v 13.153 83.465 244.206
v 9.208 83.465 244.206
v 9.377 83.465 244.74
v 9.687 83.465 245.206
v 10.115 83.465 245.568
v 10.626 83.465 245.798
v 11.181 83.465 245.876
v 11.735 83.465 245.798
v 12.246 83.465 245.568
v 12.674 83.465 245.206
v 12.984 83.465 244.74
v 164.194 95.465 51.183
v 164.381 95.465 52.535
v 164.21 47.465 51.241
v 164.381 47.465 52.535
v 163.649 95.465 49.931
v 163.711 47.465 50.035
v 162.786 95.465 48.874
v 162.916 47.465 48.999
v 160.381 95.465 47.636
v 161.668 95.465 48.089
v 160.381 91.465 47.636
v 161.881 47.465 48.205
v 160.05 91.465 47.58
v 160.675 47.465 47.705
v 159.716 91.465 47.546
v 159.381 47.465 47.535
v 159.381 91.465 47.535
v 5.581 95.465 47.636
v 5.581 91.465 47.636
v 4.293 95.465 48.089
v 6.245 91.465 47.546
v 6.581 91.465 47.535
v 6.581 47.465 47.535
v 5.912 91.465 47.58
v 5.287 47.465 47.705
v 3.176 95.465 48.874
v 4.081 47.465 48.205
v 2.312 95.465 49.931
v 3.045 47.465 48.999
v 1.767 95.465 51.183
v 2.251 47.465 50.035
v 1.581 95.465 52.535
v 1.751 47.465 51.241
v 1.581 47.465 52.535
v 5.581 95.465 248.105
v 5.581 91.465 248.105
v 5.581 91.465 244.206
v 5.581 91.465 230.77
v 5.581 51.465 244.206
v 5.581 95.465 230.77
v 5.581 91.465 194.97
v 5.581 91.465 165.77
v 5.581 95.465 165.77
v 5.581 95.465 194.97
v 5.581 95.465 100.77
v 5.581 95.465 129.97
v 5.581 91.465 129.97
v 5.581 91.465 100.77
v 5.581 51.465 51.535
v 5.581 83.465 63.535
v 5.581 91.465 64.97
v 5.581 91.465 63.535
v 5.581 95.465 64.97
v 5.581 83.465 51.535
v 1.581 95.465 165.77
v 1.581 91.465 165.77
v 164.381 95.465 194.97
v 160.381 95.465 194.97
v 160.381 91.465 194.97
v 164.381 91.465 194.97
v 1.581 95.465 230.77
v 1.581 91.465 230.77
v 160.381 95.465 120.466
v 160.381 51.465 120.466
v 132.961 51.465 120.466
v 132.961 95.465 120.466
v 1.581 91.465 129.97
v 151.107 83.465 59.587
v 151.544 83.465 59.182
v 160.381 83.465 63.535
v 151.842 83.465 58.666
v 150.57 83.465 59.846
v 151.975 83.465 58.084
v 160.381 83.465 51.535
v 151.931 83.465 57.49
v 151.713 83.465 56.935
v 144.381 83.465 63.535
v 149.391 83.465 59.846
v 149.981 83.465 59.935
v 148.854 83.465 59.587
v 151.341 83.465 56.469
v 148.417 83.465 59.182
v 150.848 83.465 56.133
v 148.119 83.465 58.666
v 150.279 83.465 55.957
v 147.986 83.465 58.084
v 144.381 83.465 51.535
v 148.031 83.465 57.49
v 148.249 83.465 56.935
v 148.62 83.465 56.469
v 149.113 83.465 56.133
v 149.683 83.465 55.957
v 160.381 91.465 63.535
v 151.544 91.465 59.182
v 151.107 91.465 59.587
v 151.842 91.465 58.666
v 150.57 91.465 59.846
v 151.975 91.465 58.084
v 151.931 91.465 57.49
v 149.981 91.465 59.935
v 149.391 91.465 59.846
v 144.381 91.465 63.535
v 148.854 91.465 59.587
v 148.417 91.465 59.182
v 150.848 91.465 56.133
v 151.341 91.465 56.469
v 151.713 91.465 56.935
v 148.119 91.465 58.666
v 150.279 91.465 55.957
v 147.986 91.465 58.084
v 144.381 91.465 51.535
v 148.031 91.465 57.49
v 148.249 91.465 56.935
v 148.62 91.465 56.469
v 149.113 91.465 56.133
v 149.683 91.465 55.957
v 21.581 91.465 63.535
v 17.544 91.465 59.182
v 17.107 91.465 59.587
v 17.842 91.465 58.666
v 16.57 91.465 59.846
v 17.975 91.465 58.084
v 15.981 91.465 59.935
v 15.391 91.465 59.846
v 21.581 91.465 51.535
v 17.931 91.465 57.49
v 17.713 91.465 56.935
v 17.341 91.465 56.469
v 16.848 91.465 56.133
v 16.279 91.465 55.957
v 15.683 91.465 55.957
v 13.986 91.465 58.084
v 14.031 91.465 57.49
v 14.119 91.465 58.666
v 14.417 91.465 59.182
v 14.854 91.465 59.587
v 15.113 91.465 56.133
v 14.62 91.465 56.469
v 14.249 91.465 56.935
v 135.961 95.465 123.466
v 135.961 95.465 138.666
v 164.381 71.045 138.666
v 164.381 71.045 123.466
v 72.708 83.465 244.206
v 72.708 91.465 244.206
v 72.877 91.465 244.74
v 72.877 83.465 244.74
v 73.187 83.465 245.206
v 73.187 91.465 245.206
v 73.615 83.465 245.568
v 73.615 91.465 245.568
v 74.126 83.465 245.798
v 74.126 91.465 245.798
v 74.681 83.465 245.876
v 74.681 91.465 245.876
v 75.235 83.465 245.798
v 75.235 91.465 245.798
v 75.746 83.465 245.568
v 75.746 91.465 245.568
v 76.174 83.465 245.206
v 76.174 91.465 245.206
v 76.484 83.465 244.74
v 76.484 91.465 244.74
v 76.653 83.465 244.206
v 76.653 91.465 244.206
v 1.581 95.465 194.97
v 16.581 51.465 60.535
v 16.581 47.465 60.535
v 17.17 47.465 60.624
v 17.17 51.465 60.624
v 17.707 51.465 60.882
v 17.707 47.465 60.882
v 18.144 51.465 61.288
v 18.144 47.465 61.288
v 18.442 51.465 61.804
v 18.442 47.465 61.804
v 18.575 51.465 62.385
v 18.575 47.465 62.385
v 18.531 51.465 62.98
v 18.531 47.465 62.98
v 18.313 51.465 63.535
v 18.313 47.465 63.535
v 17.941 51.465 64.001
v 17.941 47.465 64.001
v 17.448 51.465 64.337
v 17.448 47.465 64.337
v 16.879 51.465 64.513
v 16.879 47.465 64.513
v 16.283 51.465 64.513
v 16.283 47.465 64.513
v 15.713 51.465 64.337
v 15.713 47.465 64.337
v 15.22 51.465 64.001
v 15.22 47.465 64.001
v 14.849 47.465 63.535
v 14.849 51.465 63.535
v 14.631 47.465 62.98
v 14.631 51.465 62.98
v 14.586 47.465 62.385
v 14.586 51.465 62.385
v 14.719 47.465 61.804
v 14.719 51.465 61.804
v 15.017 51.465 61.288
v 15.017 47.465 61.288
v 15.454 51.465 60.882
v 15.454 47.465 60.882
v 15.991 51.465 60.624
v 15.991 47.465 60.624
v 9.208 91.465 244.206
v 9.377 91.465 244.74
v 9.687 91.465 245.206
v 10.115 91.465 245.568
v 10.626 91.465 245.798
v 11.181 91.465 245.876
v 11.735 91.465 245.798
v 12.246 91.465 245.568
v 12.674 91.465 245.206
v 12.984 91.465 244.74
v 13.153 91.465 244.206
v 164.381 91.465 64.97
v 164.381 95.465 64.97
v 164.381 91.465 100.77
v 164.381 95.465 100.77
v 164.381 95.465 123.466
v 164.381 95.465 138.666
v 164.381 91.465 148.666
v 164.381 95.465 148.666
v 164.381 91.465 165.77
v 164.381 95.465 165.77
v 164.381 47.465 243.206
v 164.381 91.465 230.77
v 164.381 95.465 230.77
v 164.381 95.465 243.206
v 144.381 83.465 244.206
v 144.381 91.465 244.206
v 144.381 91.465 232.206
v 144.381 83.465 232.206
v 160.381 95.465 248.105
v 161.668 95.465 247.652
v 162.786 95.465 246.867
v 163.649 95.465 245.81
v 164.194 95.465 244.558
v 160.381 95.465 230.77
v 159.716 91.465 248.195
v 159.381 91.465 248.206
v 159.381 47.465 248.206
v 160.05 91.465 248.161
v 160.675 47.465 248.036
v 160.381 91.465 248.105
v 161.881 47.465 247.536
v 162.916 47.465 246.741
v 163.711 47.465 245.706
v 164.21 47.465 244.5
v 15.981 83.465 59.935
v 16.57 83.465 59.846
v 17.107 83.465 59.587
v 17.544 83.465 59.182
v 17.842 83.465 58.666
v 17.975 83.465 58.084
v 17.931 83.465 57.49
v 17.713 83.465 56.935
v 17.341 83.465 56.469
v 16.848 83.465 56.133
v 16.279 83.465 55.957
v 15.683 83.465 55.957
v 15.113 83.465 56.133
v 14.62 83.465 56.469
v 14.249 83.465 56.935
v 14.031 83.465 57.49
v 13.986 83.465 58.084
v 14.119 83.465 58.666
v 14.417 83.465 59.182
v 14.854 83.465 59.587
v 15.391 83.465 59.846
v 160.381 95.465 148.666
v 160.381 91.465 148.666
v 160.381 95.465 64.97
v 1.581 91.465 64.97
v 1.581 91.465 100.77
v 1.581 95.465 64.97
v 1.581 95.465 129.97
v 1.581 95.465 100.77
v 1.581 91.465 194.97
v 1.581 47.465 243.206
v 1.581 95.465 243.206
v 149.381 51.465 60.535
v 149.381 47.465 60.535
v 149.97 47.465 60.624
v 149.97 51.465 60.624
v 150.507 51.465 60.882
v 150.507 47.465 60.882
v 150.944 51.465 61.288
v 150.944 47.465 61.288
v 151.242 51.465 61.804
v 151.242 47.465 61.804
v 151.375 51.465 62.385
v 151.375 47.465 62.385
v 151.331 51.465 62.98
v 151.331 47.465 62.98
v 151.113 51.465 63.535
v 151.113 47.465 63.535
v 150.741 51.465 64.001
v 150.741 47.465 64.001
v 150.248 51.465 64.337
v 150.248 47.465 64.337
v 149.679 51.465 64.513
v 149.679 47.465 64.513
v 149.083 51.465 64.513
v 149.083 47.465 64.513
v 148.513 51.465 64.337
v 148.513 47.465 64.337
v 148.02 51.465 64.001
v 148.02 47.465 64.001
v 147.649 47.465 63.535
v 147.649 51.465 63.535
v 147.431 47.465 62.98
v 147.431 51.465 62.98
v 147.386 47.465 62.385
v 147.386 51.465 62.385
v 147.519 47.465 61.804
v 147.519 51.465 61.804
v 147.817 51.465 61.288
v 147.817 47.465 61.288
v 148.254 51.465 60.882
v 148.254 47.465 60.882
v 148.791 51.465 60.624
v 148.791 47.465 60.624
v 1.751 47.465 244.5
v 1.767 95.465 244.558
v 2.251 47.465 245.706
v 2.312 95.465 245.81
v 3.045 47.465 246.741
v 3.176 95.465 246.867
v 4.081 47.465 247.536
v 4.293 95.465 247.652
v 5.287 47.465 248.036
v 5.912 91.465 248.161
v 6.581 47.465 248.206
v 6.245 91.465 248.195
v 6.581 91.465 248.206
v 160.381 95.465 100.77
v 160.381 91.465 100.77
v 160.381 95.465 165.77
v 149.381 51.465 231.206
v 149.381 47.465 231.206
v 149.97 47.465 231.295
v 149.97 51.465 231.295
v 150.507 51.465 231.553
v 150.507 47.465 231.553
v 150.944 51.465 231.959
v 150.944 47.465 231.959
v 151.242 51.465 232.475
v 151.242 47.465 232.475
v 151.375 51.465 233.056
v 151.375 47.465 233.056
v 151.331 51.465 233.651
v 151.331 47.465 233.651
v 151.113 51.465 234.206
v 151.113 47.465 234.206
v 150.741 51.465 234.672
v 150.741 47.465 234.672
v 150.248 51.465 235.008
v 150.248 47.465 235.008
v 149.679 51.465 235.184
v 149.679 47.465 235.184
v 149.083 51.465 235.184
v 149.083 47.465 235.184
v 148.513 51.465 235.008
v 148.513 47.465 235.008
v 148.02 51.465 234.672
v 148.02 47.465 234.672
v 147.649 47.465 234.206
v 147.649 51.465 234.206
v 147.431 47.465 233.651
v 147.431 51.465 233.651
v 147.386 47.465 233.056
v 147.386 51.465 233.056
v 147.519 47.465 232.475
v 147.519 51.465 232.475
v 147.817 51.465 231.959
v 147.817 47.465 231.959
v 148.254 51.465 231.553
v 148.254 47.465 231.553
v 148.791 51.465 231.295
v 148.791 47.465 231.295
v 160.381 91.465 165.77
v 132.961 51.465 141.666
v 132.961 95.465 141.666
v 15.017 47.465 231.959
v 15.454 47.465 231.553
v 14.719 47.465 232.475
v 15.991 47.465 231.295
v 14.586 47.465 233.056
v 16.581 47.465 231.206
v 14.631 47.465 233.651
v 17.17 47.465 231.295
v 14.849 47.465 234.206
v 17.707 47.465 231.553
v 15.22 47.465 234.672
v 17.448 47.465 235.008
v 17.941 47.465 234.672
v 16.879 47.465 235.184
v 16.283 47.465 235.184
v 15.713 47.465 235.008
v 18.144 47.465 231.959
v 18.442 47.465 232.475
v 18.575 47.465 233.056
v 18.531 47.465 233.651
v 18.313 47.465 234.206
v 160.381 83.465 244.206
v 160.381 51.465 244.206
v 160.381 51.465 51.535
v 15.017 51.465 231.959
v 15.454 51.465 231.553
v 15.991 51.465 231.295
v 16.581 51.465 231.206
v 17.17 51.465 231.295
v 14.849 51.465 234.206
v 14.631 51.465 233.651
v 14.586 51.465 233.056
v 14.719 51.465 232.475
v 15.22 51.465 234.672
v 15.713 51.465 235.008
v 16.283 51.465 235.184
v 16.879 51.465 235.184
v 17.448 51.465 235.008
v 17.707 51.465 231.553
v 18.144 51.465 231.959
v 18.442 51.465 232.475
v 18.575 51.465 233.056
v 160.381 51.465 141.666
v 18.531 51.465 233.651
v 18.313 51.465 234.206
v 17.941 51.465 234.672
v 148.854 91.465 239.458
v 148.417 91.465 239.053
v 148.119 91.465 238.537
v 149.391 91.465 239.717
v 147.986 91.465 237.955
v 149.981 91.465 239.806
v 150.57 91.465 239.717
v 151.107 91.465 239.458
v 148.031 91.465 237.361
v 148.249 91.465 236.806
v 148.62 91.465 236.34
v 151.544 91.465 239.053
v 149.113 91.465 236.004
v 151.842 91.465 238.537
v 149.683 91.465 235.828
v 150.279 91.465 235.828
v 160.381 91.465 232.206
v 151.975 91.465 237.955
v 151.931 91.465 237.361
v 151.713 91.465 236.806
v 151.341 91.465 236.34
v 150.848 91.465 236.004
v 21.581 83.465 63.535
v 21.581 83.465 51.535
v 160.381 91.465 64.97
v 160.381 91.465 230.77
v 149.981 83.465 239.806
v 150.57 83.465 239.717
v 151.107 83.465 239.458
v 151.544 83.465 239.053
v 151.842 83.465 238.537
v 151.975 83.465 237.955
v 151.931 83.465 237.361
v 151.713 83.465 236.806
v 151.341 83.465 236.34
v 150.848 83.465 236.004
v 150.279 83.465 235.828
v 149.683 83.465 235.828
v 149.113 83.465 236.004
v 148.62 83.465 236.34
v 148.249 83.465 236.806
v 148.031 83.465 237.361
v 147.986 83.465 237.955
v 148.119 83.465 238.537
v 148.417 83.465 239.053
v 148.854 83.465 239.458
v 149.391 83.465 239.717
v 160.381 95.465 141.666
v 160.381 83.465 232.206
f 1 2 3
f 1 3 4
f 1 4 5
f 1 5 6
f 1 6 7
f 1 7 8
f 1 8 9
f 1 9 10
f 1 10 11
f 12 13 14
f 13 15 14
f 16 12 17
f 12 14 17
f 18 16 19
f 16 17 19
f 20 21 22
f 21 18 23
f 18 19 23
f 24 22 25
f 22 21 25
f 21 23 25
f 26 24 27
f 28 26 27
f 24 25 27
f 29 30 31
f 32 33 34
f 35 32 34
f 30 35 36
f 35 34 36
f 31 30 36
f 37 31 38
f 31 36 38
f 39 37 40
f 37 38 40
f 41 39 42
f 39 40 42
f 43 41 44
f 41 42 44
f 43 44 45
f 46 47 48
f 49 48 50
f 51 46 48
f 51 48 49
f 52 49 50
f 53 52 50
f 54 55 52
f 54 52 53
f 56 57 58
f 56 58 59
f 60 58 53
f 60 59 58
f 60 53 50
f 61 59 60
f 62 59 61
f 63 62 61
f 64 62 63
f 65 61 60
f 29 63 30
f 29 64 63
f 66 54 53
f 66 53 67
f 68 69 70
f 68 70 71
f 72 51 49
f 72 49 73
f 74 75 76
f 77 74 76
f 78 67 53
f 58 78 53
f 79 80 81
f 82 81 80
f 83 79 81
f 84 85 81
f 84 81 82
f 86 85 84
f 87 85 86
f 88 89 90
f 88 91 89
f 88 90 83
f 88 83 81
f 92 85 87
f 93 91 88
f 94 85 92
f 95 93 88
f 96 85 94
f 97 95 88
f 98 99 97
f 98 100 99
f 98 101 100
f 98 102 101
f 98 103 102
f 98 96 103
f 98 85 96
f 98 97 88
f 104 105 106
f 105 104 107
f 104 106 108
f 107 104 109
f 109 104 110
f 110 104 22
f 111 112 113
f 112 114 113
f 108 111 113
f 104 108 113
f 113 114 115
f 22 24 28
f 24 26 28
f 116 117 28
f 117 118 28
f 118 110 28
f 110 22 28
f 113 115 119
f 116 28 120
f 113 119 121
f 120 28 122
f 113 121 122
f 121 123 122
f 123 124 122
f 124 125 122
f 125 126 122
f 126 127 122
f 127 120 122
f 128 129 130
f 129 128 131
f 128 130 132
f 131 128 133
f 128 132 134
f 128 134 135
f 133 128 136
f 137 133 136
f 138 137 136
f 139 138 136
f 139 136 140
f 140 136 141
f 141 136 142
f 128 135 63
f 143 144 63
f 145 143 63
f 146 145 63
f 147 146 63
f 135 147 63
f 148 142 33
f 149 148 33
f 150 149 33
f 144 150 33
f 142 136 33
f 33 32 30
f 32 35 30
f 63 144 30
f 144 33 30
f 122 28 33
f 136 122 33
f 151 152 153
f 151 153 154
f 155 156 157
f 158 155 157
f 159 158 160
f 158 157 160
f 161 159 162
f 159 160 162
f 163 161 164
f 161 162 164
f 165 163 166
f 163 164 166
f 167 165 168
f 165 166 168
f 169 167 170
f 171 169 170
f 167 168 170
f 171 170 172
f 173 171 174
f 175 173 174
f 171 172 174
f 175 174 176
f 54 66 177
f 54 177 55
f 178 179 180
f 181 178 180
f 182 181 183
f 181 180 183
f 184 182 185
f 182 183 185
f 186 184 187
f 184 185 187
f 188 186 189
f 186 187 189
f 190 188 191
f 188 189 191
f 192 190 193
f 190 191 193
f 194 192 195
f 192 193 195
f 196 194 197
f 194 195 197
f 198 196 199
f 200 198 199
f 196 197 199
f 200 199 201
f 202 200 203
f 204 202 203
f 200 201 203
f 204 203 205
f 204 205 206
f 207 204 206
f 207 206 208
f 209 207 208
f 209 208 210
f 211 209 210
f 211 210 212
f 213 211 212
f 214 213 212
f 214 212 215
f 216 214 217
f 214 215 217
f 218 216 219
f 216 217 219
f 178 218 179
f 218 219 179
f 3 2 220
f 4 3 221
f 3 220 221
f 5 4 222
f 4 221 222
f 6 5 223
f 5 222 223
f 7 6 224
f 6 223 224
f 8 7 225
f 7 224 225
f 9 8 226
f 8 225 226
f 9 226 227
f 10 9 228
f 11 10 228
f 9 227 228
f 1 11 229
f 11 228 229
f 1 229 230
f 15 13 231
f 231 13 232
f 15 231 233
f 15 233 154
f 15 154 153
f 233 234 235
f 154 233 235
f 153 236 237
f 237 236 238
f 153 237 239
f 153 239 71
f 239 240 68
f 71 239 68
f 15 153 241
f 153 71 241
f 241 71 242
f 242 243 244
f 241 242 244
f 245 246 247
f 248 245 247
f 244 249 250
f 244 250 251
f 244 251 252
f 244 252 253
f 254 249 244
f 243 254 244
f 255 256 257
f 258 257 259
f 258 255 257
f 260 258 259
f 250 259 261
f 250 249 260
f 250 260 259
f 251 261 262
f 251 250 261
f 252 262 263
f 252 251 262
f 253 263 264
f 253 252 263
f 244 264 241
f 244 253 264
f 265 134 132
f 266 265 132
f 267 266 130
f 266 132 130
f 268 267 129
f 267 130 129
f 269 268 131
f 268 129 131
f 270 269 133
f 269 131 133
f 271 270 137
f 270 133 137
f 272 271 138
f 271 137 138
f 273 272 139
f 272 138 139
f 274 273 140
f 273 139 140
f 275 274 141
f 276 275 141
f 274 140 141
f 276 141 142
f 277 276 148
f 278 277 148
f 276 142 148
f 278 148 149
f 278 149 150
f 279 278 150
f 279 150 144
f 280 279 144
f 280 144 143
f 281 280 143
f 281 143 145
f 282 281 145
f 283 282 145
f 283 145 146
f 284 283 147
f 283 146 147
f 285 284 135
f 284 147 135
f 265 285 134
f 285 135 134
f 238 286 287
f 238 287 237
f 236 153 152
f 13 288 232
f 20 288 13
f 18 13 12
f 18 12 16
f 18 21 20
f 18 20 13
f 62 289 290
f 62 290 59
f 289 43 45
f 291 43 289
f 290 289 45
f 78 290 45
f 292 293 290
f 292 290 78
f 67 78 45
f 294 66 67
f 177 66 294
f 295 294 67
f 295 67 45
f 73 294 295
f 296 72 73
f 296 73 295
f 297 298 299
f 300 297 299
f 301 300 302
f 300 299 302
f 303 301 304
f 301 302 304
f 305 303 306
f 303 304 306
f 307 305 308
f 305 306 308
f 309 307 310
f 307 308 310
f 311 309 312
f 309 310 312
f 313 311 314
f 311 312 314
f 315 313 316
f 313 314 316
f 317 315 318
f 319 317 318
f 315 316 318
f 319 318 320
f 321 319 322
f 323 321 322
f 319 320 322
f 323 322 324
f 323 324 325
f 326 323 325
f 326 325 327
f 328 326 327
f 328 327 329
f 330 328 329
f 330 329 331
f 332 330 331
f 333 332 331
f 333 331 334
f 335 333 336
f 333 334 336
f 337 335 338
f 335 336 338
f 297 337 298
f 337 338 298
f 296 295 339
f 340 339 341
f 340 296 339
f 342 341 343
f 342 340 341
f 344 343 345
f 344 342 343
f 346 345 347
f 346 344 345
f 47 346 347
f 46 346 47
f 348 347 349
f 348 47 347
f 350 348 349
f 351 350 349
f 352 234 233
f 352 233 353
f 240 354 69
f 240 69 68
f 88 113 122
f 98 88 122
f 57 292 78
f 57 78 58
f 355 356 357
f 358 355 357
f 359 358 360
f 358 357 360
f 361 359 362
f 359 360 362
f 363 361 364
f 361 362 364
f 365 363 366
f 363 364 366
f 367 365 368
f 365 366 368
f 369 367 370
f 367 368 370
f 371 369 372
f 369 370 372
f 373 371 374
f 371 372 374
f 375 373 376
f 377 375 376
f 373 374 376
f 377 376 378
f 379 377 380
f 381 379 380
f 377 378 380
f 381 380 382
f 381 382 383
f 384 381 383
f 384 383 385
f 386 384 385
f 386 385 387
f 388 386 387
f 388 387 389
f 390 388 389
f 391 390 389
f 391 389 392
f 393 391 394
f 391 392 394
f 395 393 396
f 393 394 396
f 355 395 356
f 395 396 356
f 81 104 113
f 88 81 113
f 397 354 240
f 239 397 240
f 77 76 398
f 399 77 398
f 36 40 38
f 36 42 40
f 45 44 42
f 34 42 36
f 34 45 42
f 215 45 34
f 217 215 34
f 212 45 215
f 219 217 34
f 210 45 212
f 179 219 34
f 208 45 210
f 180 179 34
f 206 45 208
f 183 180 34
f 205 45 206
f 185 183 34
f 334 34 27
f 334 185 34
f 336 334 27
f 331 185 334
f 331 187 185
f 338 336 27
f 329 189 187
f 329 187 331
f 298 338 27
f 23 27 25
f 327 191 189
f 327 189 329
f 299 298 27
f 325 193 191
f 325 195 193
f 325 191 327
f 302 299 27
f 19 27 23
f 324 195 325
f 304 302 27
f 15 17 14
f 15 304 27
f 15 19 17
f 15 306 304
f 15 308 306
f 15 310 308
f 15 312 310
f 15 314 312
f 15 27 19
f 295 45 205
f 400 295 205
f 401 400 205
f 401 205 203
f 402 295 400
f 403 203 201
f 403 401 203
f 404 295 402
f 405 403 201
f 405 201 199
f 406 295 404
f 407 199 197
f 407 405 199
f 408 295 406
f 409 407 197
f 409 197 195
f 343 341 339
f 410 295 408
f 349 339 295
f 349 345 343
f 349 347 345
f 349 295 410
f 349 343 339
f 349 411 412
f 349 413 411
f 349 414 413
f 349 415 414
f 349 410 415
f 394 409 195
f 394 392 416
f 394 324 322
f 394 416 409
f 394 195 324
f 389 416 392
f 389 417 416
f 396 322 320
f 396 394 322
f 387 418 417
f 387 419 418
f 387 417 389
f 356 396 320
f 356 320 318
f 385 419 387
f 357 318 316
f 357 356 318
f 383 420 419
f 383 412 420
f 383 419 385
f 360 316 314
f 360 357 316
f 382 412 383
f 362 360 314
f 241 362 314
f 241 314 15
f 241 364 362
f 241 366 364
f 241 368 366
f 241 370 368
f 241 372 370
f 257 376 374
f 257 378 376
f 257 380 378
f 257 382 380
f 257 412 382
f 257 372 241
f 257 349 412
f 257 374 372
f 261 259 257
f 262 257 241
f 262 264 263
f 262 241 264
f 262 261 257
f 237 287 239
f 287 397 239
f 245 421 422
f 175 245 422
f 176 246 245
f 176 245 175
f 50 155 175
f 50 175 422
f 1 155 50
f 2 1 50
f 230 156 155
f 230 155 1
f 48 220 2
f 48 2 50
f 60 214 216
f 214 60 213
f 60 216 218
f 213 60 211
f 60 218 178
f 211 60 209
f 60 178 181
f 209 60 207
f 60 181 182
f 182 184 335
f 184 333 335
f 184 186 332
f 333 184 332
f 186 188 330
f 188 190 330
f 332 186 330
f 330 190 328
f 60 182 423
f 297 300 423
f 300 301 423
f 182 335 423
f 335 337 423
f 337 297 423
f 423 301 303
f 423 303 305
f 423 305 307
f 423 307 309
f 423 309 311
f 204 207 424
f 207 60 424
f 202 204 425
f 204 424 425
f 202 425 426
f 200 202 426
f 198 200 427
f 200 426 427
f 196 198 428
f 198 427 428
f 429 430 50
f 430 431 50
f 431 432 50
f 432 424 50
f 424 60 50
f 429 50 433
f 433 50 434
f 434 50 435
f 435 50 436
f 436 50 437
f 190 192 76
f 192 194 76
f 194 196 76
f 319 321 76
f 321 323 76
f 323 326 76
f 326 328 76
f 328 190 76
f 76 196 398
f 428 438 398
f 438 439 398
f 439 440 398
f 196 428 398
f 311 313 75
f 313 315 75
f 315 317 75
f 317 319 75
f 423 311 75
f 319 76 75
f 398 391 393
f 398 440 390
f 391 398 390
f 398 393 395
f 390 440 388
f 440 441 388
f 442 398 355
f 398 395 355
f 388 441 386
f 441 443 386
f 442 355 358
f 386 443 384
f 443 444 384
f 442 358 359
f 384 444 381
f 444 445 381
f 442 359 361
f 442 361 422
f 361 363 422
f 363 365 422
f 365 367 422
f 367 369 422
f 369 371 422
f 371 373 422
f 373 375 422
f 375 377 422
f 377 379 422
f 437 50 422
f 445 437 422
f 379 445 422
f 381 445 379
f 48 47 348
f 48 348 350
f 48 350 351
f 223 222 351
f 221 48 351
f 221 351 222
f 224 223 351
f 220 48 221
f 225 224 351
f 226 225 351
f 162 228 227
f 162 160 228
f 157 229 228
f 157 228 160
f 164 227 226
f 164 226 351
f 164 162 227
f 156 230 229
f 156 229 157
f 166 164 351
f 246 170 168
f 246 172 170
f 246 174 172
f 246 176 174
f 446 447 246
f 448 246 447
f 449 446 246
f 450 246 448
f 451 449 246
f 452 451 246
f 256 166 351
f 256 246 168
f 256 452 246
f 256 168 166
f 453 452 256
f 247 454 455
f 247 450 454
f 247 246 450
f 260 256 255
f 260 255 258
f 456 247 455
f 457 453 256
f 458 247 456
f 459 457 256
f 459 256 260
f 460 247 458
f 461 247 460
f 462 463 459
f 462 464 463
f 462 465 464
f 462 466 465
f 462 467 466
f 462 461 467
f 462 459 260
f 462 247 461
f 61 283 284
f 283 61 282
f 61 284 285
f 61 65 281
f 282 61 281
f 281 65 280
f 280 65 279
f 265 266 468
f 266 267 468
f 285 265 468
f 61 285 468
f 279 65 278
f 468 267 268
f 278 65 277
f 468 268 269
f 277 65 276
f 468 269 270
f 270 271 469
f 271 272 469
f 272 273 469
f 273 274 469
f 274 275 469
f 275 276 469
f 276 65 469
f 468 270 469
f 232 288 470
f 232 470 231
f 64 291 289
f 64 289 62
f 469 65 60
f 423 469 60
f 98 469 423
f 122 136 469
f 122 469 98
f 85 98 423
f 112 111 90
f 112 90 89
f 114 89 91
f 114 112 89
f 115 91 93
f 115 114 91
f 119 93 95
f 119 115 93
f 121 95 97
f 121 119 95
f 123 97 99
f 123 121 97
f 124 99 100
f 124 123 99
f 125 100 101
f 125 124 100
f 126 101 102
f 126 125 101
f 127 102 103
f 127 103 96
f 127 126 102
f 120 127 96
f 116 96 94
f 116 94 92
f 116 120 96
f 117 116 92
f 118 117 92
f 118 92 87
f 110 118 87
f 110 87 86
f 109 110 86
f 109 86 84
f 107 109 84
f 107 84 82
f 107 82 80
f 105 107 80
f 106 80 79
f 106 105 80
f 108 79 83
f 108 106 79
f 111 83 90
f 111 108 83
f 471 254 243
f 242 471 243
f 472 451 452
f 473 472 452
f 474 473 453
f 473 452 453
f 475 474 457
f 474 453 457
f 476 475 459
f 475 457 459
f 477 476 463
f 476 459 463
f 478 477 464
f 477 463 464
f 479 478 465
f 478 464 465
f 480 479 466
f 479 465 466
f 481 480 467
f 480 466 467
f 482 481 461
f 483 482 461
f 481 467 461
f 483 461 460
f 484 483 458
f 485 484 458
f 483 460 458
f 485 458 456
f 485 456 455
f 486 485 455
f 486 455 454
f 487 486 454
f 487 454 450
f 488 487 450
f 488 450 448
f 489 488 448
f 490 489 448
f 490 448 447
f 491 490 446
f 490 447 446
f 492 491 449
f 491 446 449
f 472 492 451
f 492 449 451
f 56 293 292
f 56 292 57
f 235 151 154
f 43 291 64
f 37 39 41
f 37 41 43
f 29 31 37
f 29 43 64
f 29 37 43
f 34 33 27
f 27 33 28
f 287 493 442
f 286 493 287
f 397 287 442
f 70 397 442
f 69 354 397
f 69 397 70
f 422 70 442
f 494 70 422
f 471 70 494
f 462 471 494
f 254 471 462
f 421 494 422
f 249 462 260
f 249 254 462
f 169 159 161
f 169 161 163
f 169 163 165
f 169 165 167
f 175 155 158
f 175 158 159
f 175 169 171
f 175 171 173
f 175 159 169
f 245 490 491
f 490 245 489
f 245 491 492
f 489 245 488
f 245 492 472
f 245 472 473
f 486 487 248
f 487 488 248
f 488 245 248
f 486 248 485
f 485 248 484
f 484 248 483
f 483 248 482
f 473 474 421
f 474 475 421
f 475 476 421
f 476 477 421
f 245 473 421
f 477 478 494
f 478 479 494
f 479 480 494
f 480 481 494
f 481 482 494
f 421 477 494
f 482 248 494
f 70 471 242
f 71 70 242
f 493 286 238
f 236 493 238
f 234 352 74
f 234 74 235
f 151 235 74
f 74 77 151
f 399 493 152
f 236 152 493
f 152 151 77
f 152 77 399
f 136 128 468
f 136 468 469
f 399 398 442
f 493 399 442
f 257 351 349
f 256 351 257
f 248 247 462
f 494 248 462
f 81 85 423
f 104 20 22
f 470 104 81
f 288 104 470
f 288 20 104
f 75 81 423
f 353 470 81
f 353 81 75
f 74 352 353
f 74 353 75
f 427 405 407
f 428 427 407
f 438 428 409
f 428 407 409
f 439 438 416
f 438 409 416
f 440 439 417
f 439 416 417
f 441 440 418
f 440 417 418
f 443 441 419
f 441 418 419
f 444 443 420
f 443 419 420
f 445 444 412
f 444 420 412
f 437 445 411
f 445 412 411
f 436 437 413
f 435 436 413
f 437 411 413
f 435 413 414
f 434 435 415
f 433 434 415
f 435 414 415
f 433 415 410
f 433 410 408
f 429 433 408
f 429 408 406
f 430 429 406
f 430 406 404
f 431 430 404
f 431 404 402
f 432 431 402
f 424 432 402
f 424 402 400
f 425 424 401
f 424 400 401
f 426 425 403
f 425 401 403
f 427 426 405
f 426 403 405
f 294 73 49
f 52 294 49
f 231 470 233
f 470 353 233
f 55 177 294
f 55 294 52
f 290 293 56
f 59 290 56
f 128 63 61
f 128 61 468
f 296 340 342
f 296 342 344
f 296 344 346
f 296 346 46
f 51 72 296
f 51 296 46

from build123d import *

# Parameters (mm, degrees)
BOSS_EXTRUDE2_DEPTH   = 4
SKETCH1_W             = 4.0000000000000036
SKETCH1_H             = 29.19999999999999
BOSS_EXTRUDE2_2_DEPTH = 4
BOSS_EXTRUDE2_3_DEPTH = 4
BOSS_EXTRUDE2_4_DEPTH = 4
SKETCH1_W_2           = 4
SKETCH1_H_2           = 17.435500273431558
BOSS_EXTRUDE2_5_DEPTH = 4
BOSS_EXTRUDE2_6_DEPTH = 4
BOSS_EXTRUDE2_7_DEPTH = 4
SKETCH1_H_3           = 17.43550027343155
BOSS_EXTRUDE2_8_DEPTH = 4
CUT_EXTRUDE1_DEPTH    = 4
SKETCH3_W             = 162.8
SKETCH3_H             = 200.6710005468631
BOSS_EXTRUDE3_DEPTH   = 40
SKETCH4_W             = 162.8
SKETCH4_H             = 200.6710005468631
BOSS_EXTRUDE4_DEPTH   = 4
FILLET1_R             = 5
FILLET2_R             = 5
FILLET3_R             = 5
FILLET4_R             = 5
SKETCH5_R             = 1.9999999999999967
SKETCH5_R_2           = 2
SKETCH5_R_3           = 2.0000000000000036
CUT_EXTRUDE2_DEPTH    = 4
BOSS_EXTRUDE5_DEPTH   = 8
SKETCH7_R             = 2.0000000000000036
CUT_EXTRUDE3_DEPTH    = 8
SKETCH8_W             = 16
SKETCH8_H             = 12
BOSS_EXTRUDE6_DEPTH   = 8
SKETCH9_R             = 1.9999999999999967
CUT_EXTRUDE4_DEPTH    = 8
SKETCH11_R            = 2
SKETCH11_R_2          = 1.9999999999999967
CUT_EXTRUDE5_DEPTH    = 8
SKETCH12_W            = 15.199999999999989
SKETCH12_H            = 20.419999999999987
CUT_EXTRUDE6_DEPTH    = 4
BOSS_EXTRUDE7_DEPTH   = 44
SKETCH14_W            = 24.419999999999987
SKETCH14_H            = 15.199999999999989
BOSS_EXTRUDE8_DEPTH   = 19.58
CHAMFER2_SIZE2        = 24.42
CHAMFER2_SIZE         = 28.42


with BuildPart() as part:
    # Sketch1 → Boss-Extrude2 (new body)
    with BuildSketch(Plane(origin=(0, 95.46497129757712, 0), x_dir=(1, 0, 0), z_dir=(0, 1, 0))):
        Polygon((5.580685050864992, -64.97044696543385), (5.580685050864992, -47.5349466920023), (1.580685050864986, -47.5349466920023), (1.5806850508649888, -64.97044696543384), align=None)
    extrude(amount=-BOSS_EXTRUDE2_DEPTH)



with BuildPart() as body_2:
    # Sketch1 → Boss-Extrude2 2 (new body)
    with BuildSketch(Plane(origin=(0, 95.46497129757712, 0), x_dir=(1, 0, 0), z_dir=(0, 1, 0))):
        with Locations((3.5806850508649903, -115.37044696543384)):
            Rectangle(SKETCH1_W, SKETCH1_H)
    extrude(amount=-BOSS_EXTRUDE2_2_DEPTH)


with BuildPart() as body_3:
    # Sketch1 → Boss-Extrude2 3 (new body)
    with BuildSketch(Plane(origin=(0, 95.46497129757712, 0), x_dir=(1, 0, 0), z_dir=(0, 1, 0))):
        Polygon((5.580685050864992, -165.77044696543385), (1.5806850508649957, -165.77044696543385), (1.5806850508649888, -194.97044696543384), (5.580685050864992, -194.97044696543384), align=None)
    extrude(amount=-BOSS_EXTRUDE2_3_DEPTH)


with BuildPart() as body_4:
    # Sketch1 → Boss-Extrude2 4 (new body)
    with BuildSketch(Plane(origin=(0, 95.46497129757712, 0), x_dir=(1, 0, 0), z_dir=(0, 1, 0))):
        Polygon((5.580685050864992, -230.77044696543385), (1.5806850508649888, -230.77044696543385), (1.5806850508649888, -248.2059472388654), (5.580685050864986, -248.2059472388654), align=None)
    extrude(amount=-BOSS_EXTRUDE2_4_DEPTH)


with BuildPart() as body_5:
    # Sketch1 → Boss-Extrude2 5 (new body)
    with BuildSketch(Plane(origin=(0, 95.46497129757712, 0), x_dir=(1, 0, 0), z_dir=(0, 1, 0))):
        with Locations((162.380685050865, -239.48819710214963)):
            Rectangle(SKETCH1_W_2, SKETCH1_H_2)
    extrude(amount=-BOSS_EXTRUDE2_5_DEPTH)


with BuildPart() as body_6:
    # Sketch1 → Boss-Extrude2 6 (new body)
    with BuildSketch(Plane(origin=(0, 95.46497129757712, 0), x_dir=(1, 0, 0), z_dir=(0, 1, 0))):
        with Locations((162.380685050865, -180.37044696543384)):
            Rectangle(SKETCH1_W_2, SKETCH1_H)
    extrude(amount=-BOSS_EXTRUDE2_6_DEPTH)


with BuildPart() as body_7:
    # Sketch1 → Boss-Extrude2 7 (new body)
    with BuildSketch(Plane(origin=(0, 95.46497129757712, 0), x_dir=(1, 0, 0), z_dir=(0, 1, 0))):
        Polygon((164.380685050865, -148.66643660097685), (164.380685050865, -100.77044696543385), (160.380685050865, -100.77044696543385), (160.380685050865, -123.46643660097686), (136.36222349016015, -123.46643660097686), (136.36222349016015, -138.66643660097685), (160.380685050865, -138.66643660097685), (160.380685050865, -148.66643660097685), align=None)
    extrude(amount=-BOSS_EXTRUDE2_7_DEPTH)

    # Sketch2 → Cut-Extrude1 (cut)
    with BuildSketch(Plane(origin=(0, 95.46497129757712, 0), x_dir=(1, 0, 0), z_dir=(0, 1, 0))):
        Polygon((160.380685050865, -123.46643660097686), (136.36222349016015, -123.46643660097686), (136.36222349016015, -138.66643660097685), (160.380685050865, -138.66643660097685), (164.380685050865, -138.66643660097685), (164.380685050865, -123.46643660097686), align=None)
    extrude(amount=-CUT_EXTRUDE1_DEPTH, mode=Mode.SUBTRACT)


with BuildPart() as body_8:
    # Sketch1 → Boss-Extrude2 8 (new body)
    with BuildSketch(Plane(origin=(0, 95.46497129757712, 0), x_dir=(1, 0, 0), z_dir=(0, 1, 0))):
        with Locations((162.380685050865, -56.25269682871807)):
            Rectangle(SKETCH1_W_2, SKETCH1_H_3)
    extrude(amount=-BOSS_EXTRUDE2_8_DEPTH)


with BuildPart() as cut_extrude1_piece_1:
    # of the separate pieces the step leaves, piece 1, a body of its own (cut_extrude1_pieces)
    add(body_7.part.solids().sort_by_distance((164.380685051, 95.464971298, 123.466436601))[0])


with BuildPart() as cut_extrude1_piece_2:
    # of the separate pieces the step leaves, piece 2, a body of its own (cut_extrude1_pieces)
    add(body_7.part.solids().sort_by_distance((164.380685051, 95.464971298, 148.666436601))[0])


with BuildPart() as part_1:
    add(part.part)

    add(body_2.part)  # Boss-Extrude3 merges body 2

    add(body_3.part)  # Boss-Extrude3 merges body 3

    add(body_4.part)  # Boss-Extrude3 merges body 4

    add(body_5.part)  # Boss-Extrude3 merges body 5

    add(body_6.part)  # Boss-Extrude3 merges body 6

    add(body_8.part)  # Boss-Extrude3 merges body 8

    add(cut_extrude1_piece_1.part)  # Boss-Extrude3 merges Cut-Extrude1 piece 1

    add(cut_extrude1_piece_2.part)  # Boss-Extrude3 merges Cut-Extrude1 piece 2
    # Sketch3 → Boss-Extrude3 (add)
    with BuildSketch(Plane.XZ.offset(-91.46497129757712)):
        with Locations((82.98068505086499, 147.87044696543384)):
            Rectangle(SKETCH3_W, SKETCH3_H)
        Polygon((160.380685050865, 51.5349466920023), (160.380685050865, 244.2059472388654), (5.580685050864989, 244.2059472388654), (5.580685050864981, 51.5349466920023), align=None, mode=Mode.SUBTRACT)
    extrude(amount=BOSS_EXTRUDE3_DEPTH)

    # Sketch4 → Boss-Extrude4 (add)
    with BuildSketch(Plane.XZ.offset(-51.46497129757712)):
        with Locations((82.98068505086499, 147.87044696543384)):
            Rectangle(SKETCH4_W, SKETCH4_H)
    extrude(amount=BOSS_EXTRUDE4_DEPTH)

    # Fillet1
    fillet1_edges = [part_1.edges().sort_by_distance(p)[0] for p in [
        (1.5806850508649881, 71.46497129757712, 248.2059472388654),
    ]]
    fillet(fillet1_edges, radius=FILLET1_R)

    # Fillet2
    fillet2_edges = [part_1.edges().sort_by_distance(p)[0] for p in [
        (164.380685050865, 71.46497129757712, 248.2059472388654),
    ]]
    fillet(fillet2_edges, radius=FILLET2_R)

    # Fillet3
    fillet3_edges = [part_1.edges().sort_by_distance(p)[0] for p in [
        (164.380685050865, 71.46497129757712, 47.53494669200231),
    ]]
    fillet(fillet3_edges, radius=FILLET3_R)

    # Fillet4
    fillet4_edges = [part_1.edges().sort_by_distance(p)[0] for p in [
        (1.5806850508649881, 71.46497129757712, 47.53494669200231),
    ]]
    fillet(fillet4_edges, radius=FILLET4_R)

    # Sketch5 → Cut-Extrude2 (cut)
    with BuildSketch(Plane.XZ.offset(-47.46497129757712)):
        with Locations(Location((149.380685050865, 62.53494669200229, 0), (0, 0, 270))):
            Circle(SKETCH5_R)
        with Locations(Location((16.580685050864986, 62.53494669200231, 0), (0, 0, 270))):
            Circle(SKETCH5_R_2)
        with Locations(Location((149.380685050865, 233.20594723886538, 0), (0, 0, 270))):
            Circle(SKETCH5_R)
        with Locations(Location((16.58068505086499, 233.2059472388654, 0), (0, 0, 270))):
            Circle(SKETCH5_R_3)
    extrude(amount=-CUT_EXTRUDE2_DEPTH, mode=Mode.SUBTRACT)

    # Sketch6 → Boss-Extrude5 (add)
    with BuildSketch(Plane(origin=(0, 91.46497129757712, 0), x_dir=(1, 0, 0), z_dir=(0, 1, 0))):
        Polygon((21.580685050864982, -63.534946692002315), (21.580685050864975, -51.5349466920023), (5.580685050864992, -51.5349466920023), (5.580685050864982, -63.53494669200232), align=None)
    boss_extrude5 = extrude(amount=-BOSS_EXTRUDE5_DEPTH)

    # Sketch7 → Cut-Extrude3 (cut)
    with BuildSketch(Plane(origin=(0, 91.46497129757712, 0), x_dir=(1, 0, 0), z_dir=(0, 1, 0))):
        with Locations(Location((15.980685050864993, -57.934946692002306, 0), (0, 0, 270))):
            Circle(SKETCH7_R)
    cut_extrude3 = extrude(amount=-CUT_EXTRUDE3_DEPTH, mode=Mode.SUBTRACT)

    # Mirror1: Boss-Extrude5, Cut-Extrude3 across plane
    add(boss_extrude5.mirror(Plane.ZY.offset(-82.980685050865)))
    add(cut_extrude3.mirror(Plane.ZY.offset(-82.980685050865)), mode=Mode.SUBTRACT)

    # Sketch8 → Boss-Extrude6 (add)
    with BuildSketch(Plane(origin=(0, 91.46497129757712, 0), x_dir=(1, 0, 0), z_dir=(0, 1, 0))):
        with Locations((152.380685050865, -238.2059472388654)):
            Rectangle(SKETCH8_W, SKETCH8_H)
    extrude(amount=-BOSS_EXTRUDE6_DEPTH)

    # Sketch9 → Cut-Extrude4 (cut)
    with BuildSketch(Plane(origin=(0, 91.46497129757712, 0), x_dir=(1, 0, 0), z_dir=(0, 1, 0))):
        with Locations(Location((149.98068505086505, -237.8059472388654, 0), (0, 0, 270))):
            Circle(SKETCH9_R)
    extrude(amount=-CUT_EXTRUDE4_DEPTH, mode=Mode.SUBTRACT)

    # Sketch11 → Cut-Extrude5 (cut)
    with BuildSketch(Plane(origin=(0, 91.46497129757712, 0), x_dir=(1, 0, 0), z_dir=(0, 1, 0))):
        with Locations((11.180685050864989, -243.87594723886542)):
            Circle(SKETCH11_R)
        with Locations((74.680685050865, -243.87594723886542)):
            Circle(SKETCH11_R_2)
    extrude(amount=-CUT_EXTRUDE5_DEPTH, mode=Mode.SUBTRACT)

    # Sketch12 → Cut-Extrude6 (cut)
    with BuildSketch(Plane(origin=(164.380685050865, 0, 0), x_dir=(0, 0, -1), z_dir=(1, 0, 0))):
        with Locations((-131.06643660097686, 81.25497129757713)):
            Rectangle(SKETCH12_W, SKETCH12_H)
    extrude(amount=-CUT_EXTRUDE6_DEPTH, mode=Mode.SUBTRACT)

    # Sketch13 → Boss-Extrude7 (add)
    with BuildSketch(Plane(origin=(0, 51.46497129757712, 0), x_dir=(1, 0, 0), z_dir=(0, 1, 0))):
        Polygon((135.960685050865, -123.46643660097686), (160.380685050865, -123.46643660097686), (160.380685050865, -120.46643660097686), (132.960685050865, -120.46643660097686), (132.960685050865, -141.66643660097685), (160.380685050865, -141.66643660097685), (160.380685050865, -138.66643660097685), (135.960685050865, -138.66643660097685), align=None)
    extrude(amount=BOSS_EXTRUDE7_DEPTH)

    # Sketch14 → Boss-Extrude8 (add)
    with BuildSketch(Plane(origin=(0, 51.46497129757712, 0), x_dir=(1, 0, 0), z_dir=(0, 1, 0))):
        with Locations((148.17068505086502, -131.06643660097686)):
            Rectangle(SKETCH14_W, SKETCH14_H)
    extrude(amount=BOSS_EXTRUDE8_DEPTH)

    # Chamfer2
    chamfer2_edges = [part_1.edges().sort_by_distance(p)[0] for p in [
        (135.960685050865, 71.04497129757712, 131.06643660097686),
    ]]
    chamfer2_side = [part_1.faces().sort_by_distance(p)[0] for p in [
        (136.44908505086502, 71.04497129757712, 131.06643660097686),
    ]]
    chamfer(chamfer2_edges, length=CHAMFER2_SIZE - 0.0001, length2=CHAMFER2_SIZE2 - 0.0001, reference=chamfer2_side[0])  # a hair under: the kernel refuses the full size


solid = part_1.part
